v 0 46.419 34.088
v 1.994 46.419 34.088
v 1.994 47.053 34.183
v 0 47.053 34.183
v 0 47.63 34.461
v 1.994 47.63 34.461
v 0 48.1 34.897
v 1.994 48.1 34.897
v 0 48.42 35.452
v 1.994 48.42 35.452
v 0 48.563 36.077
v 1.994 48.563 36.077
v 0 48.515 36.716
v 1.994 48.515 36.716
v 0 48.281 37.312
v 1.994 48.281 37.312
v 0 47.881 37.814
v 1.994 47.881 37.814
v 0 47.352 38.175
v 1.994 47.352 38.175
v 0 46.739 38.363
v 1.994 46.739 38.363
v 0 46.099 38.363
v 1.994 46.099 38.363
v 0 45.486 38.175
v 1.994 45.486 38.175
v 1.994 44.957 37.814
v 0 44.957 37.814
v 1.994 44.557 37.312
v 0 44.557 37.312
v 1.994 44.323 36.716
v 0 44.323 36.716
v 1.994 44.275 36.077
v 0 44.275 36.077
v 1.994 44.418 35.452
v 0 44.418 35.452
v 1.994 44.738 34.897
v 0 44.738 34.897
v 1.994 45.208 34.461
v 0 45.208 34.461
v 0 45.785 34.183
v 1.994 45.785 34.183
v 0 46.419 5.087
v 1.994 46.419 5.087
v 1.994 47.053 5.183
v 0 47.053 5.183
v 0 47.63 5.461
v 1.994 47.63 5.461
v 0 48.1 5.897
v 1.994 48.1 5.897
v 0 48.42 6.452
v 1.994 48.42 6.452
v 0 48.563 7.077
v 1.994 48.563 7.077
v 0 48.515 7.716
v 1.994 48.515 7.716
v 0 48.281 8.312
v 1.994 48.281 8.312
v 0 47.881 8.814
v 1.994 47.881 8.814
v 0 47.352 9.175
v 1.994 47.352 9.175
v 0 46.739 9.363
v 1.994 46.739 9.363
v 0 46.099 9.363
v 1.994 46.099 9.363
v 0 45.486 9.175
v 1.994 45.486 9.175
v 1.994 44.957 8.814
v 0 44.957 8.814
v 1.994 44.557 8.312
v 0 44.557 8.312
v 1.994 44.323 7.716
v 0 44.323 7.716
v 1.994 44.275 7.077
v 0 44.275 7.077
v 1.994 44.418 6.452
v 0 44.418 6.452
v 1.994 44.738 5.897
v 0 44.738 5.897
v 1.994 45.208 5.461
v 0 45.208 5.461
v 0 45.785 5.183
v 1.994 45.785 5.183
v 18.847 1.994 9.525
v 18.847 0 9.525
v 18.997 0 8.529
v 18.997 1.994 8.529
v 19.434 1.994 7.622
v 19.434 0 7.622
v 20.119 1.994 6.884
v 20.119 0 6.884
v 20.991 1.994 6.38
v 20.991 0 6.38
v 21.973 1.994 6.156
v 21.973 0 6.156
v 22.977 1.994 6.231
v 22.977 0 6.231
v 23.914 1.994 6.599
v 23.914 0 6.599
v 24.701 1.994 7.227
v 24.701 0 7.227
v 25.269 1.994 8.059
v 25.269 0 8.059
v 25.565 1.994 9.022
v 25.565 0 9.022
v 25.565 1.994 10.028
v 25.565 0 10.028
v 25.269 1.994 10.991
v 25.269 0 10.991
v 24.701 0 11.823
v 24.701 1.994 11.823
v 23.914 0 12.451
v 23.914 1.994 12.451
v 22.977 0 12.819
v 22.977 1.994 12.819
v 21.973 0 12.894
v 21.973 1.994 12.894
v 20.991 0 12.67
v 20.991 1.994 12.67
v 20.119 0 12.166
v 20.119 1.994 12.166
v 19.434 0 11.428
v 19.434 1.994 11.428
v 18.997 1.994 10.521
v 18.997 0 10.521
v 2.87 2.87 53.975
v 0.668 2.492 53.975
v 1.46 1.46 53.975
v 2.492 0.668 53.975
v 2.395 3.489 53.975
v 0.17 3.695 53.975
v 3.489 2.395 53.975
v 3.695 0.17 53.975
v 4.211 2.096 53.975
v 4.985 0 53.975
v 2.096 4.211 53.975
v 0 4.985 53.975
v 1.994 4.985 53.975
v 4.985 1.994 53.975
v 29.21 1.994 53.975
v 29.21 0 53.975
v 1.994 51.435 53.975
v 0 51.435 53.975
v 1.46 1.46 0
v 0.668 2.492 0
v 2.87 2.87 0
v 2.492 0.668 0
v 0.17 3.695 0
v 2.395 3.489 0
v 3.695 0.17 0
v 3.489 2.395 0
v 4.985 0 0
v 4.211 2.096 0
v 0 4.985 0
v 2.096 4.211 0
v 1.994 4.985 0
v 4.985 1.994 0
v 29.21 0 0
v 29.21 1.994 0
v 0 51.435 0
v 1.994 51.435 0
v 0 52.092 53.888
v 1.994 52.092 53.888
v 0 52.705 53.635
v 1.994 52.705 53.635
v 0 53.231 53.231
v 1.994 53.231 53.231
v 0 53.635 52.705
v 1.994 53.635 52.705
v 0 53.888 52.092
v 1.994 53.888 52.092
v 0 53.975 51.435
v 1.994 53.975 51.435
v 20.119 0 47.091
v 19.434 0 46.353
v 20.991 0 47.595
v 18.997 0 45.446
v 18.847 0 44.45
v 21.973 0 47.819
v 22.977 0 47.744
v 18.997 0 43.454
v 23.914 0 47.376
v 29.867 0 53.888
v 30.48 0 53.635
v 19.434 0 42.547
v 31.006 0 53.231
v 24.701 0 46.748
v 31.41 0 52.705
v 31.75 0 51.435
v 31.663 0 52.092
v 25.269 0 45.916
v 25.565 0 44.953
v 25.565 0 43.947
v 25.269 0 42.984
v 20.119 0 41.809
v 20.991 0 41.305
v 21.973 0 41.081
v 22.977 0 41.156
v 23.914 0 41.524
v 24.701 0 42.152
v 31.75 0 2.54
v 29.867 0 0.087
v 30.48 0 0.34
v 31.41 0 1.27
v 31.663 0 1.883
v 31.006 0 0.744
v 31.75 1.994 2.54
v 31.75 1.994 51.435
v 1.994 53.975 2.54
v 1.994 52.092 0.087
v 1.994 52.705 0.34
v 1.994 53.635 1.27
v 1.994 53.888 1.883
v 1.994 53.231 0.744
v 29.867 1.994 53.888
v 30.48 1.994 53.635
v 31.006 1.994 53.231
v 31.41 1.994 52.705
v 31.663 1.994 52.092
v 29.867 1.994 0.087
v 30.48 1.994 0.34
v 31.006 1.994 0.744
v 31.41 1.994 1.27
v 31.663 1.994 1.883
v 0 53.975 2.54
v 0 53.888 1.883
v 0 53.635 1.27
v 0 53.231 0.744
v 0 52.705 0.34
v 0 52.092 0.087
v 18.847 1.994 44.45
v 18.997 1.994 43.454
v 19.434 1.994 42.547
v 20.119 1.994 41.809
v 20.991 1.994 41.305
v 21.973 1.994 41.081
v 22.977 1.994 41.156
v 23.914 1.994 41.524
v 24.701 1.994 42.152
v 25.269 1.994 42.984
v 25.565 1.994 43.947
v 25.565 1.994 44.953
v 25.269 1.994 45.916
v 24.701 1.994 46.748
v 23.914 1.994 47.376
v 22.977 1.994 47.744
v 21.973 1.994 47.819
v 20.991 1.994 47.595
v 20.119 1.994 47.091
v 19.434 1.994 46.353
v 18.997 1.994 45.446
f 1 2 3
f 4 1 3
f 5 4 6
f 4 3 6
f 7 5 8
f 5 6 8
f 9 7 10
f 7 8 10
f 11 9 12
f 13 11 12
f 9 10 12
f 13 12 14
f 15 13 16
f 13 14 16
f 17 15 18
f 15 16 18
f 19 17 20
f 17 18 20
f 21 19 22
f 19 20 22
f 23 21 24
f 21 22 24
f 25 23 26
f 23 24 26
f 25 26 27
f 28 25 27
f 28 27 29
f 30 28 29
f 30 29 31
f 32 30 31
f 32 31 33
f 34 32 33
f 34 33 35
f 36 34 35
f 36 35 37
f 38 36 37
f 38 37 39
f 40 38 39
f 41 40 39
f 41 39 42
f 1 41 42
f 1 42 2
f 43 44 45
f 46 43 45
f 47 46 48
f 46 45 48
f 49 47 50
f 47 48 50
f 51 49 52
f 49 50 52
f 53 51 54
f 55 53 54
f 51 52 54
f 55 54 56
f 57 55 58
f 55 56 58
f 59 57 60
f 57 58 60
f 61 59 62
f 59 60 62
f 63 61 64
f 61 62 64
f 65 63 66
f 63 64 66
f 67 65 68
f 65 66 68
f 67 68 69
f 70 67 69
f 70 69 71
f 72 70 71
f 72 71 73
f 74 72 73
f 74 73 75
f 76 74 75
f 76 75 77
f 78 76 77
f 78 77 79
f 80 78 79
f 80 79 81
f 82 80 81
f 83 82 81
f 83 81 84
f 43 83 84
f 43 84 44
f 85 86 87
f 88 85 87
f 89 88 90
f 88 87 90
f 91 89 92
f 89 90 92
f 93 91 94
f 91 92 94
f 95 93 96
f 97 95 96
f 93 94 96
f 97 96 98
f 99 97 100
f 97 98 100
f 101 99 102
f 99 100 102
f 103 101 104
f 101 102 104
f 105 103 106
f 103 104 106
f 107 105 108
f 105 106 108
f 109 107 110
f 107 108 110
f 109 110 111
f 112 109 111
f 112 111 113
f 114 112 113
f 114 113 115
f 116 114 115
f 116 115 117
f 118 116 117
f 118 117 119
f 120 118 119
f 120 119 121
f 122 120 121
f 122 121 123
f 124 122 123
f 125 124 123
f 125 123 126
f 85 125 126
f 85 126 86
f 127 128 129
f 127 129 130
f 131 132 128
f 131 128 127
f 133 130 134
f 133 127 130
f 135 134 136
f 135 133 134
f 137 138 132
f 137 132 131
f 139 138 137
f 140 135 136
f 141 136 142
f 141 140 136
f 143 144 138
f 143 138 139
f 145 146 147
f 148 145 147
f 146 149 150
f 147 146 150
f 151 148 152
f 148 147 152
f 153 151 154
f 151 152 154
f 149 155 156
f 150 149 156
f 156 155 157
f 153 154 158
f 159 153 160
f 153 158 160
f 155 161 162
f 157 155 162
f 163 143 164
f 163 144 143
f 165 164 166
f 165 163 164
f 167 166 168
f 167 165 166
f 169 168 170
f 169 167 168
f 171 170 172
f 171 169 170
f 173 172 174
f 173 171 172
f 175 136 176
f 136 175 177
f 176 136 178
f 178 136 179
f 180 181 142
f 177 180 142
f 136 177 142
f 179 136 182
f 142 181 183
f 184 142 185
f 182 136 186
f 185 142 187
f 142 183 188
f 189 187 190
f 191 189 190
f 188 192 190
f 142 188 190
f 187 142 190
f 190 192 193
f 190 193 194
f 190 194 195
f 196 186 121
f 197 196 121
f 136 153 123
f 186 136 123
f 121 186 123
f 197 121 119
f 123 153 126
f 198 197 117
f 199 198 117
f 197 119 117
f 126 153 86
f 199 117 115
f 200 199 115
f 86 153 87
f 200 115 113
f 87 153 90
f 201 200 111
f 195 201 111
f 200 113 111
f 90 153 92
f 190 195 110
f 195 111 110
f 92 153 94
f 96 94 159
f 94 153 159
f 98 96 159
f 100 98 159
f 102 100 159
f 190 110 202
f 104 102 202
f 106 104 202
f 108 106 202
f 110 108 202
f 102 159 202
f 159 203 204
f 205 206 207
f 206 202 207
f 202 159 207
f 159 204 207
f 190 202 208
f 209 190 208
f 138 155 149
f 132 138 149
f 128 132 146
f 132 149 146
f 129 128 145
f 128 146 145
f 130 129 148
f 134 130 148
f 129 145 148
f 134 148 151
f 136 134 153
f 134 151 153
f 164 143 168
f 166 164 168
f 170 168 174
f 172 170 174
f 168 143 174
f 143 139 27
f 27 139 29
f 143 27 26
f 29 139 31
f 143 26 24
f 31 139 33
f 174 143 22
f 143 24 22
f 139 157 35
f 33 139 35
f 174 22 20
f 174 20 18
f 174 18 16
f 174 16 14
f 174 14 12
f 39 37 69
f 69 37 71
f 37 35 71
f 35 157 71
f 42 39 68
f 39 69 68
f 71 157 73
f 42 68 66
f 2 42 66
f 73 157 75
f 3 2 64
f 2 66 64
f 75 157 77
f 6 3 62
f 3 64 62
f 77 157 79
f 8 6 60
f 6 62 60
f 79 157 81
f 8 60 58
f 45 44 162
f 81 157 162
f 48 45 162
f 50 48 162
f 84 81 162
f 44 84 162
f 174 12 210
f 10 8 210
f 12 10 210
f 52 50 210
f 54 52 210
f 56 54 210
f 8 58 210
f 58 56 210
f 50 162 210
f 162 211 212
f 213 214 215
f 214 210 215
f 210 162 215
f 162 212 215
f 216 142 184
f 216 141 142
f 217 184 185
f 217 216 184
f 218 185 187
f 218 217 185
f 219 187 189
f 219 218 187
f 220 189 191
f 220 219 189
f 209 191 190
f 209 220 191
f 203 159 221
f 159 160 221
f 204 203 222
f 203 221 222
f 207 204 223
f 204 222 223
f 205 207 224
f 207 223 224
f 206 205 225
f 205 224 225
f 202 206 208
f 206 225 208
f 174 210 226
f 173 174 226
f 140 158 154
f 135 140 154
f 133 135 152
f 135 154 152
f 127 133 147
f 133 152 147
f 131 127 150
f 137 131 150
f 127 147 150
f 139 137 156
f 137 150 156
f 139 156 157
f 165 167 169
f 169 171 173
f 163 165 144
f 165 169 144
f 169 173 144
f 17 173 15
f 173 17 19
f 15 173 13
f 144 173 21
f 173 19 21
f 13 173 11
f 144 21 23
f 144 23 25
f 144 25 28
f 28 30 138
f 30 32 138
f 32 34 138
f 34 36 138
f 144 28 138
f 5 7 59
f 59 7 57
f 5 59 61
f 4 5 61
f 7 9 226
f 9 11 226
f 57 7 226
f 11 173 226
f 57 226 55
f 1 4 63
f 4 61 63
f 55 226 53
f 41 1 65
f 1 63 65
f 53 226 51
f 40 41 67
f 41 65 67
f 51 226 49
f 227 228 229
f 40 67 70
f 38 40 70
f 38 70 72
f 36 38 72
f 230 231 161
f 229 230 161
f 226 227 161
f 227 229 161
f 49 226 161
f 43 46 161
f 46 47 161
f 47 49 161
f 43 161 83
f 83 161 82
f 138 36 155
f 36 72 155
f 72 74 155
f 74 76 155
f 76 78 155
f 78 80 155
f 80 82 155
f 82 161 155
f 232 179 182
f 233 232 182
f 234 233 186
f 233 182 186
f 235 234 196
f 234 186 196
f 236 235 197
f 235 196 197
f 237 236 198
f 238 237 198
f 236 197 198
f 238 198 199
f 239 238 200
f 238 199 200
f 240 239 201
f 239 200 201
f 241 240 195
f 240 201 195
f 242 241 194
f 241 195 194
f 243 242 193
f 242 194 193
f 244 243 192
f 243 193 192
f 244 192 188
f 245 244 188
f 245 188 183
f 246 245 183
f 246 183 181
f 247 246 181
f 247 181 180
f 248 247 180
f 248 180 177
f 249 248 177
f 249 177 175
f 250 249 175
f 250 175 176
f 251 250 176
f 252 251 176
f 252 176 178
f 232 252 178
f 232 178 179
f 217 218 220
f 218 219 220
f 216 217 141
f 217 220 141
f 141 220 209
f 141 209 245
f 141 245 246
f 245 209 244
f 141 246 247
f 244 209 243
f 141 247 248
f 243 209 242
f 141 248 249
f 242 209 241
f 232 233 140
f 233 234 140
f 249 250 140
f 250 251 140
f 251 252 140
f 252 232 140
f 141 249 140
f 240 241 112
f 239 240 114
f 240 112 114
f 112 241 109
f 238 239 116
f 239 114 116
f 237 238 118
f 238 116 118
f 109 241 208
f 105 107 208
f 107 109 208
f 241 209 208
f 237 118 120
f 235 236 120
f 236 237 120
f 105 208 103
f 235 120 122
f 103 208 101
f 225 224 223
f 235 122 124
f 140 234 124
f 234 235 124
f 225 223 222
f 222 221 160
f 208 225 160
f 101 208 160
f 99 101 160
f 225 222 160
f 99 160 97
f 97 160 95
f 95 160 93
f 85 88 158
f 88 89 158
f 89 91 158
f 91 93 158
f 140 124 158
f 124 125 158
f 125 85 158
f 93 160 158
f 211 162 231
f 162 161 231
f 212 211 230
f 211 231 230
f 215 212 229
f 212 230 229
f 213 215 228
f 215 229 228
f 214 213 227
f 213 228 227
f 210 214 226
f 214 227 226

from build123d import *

# Parameters (mm, degrees)
BASE_FLANGE1_DEPTH      = 53.975
M4_CLEARANCE_HOLE1_D    = 4.3
F_1_4_CLEARANCE_HOLE1_D = 6.7564
FILLET1_R               = 2.54


# Read off the part's stored shape, not the designer's step: Base-Flange1
with BuildPart() as part:
    # Base-Flange1 outline → Base-Flange1 (new body)
    with BuildSketch(Plane.XY):
        with BuildLine():
            Line((4.98475, 0), (31.75, 0))
            Line((31.75, 0), (31.75, 1.9939))
            Line((31.75, 1.9939), (4.98475, 1.9939))
            ThreePointArc((4.98475, 1.9939), (2.869899683, 2.869899683), (1.9939, 4.98475))
            Line((1.9939, 4.98475), (1.9939, 53.975))
            Line((1.9939, 53.975), (0, 53.975))
            Line((0, 53.975), (0, 4.98475))
            ThreePointArc((0, 4.98475), (1.459999472, 1.459999472), (4.98475, 0))
        make_face()
    extrude(amount=BASE_FLANGE1_DEPTH)

    # M4 Clearance Hole1 (through all)
    with Locations(Plane.ZY):
        with Locations((36.2375, 46.419), (7.237499922, 46.419)):
            Hole(M4_CLEARANCE_HOLE1_D / 2)

    # 1/4 Clearance Hole1 (through all)
    with Locations(Plane(origin=(0, 1.9939, 0), x_dir=(1, 0, 0), z_dir=(0, 1, 0))):
        with Locations((22.225, -44.45), (22.225, -9.525)):
            Hole(F_1_4_CLEARANCE_HOLE1_D / 2)

    # Fillet1
    fillet1_edges = [part.edges().sort_by_distance(p)[0] for p in [
        (0.99695, 53.975, 53.975),
        (0.99695, 53.975, 0),
        (31.75, 0.99695, 53.975),
        (31.75, 0.99695, 0),
    ]]
    fillet(fillet1_edges, radius=FILLET1_R)


solid = part.part
